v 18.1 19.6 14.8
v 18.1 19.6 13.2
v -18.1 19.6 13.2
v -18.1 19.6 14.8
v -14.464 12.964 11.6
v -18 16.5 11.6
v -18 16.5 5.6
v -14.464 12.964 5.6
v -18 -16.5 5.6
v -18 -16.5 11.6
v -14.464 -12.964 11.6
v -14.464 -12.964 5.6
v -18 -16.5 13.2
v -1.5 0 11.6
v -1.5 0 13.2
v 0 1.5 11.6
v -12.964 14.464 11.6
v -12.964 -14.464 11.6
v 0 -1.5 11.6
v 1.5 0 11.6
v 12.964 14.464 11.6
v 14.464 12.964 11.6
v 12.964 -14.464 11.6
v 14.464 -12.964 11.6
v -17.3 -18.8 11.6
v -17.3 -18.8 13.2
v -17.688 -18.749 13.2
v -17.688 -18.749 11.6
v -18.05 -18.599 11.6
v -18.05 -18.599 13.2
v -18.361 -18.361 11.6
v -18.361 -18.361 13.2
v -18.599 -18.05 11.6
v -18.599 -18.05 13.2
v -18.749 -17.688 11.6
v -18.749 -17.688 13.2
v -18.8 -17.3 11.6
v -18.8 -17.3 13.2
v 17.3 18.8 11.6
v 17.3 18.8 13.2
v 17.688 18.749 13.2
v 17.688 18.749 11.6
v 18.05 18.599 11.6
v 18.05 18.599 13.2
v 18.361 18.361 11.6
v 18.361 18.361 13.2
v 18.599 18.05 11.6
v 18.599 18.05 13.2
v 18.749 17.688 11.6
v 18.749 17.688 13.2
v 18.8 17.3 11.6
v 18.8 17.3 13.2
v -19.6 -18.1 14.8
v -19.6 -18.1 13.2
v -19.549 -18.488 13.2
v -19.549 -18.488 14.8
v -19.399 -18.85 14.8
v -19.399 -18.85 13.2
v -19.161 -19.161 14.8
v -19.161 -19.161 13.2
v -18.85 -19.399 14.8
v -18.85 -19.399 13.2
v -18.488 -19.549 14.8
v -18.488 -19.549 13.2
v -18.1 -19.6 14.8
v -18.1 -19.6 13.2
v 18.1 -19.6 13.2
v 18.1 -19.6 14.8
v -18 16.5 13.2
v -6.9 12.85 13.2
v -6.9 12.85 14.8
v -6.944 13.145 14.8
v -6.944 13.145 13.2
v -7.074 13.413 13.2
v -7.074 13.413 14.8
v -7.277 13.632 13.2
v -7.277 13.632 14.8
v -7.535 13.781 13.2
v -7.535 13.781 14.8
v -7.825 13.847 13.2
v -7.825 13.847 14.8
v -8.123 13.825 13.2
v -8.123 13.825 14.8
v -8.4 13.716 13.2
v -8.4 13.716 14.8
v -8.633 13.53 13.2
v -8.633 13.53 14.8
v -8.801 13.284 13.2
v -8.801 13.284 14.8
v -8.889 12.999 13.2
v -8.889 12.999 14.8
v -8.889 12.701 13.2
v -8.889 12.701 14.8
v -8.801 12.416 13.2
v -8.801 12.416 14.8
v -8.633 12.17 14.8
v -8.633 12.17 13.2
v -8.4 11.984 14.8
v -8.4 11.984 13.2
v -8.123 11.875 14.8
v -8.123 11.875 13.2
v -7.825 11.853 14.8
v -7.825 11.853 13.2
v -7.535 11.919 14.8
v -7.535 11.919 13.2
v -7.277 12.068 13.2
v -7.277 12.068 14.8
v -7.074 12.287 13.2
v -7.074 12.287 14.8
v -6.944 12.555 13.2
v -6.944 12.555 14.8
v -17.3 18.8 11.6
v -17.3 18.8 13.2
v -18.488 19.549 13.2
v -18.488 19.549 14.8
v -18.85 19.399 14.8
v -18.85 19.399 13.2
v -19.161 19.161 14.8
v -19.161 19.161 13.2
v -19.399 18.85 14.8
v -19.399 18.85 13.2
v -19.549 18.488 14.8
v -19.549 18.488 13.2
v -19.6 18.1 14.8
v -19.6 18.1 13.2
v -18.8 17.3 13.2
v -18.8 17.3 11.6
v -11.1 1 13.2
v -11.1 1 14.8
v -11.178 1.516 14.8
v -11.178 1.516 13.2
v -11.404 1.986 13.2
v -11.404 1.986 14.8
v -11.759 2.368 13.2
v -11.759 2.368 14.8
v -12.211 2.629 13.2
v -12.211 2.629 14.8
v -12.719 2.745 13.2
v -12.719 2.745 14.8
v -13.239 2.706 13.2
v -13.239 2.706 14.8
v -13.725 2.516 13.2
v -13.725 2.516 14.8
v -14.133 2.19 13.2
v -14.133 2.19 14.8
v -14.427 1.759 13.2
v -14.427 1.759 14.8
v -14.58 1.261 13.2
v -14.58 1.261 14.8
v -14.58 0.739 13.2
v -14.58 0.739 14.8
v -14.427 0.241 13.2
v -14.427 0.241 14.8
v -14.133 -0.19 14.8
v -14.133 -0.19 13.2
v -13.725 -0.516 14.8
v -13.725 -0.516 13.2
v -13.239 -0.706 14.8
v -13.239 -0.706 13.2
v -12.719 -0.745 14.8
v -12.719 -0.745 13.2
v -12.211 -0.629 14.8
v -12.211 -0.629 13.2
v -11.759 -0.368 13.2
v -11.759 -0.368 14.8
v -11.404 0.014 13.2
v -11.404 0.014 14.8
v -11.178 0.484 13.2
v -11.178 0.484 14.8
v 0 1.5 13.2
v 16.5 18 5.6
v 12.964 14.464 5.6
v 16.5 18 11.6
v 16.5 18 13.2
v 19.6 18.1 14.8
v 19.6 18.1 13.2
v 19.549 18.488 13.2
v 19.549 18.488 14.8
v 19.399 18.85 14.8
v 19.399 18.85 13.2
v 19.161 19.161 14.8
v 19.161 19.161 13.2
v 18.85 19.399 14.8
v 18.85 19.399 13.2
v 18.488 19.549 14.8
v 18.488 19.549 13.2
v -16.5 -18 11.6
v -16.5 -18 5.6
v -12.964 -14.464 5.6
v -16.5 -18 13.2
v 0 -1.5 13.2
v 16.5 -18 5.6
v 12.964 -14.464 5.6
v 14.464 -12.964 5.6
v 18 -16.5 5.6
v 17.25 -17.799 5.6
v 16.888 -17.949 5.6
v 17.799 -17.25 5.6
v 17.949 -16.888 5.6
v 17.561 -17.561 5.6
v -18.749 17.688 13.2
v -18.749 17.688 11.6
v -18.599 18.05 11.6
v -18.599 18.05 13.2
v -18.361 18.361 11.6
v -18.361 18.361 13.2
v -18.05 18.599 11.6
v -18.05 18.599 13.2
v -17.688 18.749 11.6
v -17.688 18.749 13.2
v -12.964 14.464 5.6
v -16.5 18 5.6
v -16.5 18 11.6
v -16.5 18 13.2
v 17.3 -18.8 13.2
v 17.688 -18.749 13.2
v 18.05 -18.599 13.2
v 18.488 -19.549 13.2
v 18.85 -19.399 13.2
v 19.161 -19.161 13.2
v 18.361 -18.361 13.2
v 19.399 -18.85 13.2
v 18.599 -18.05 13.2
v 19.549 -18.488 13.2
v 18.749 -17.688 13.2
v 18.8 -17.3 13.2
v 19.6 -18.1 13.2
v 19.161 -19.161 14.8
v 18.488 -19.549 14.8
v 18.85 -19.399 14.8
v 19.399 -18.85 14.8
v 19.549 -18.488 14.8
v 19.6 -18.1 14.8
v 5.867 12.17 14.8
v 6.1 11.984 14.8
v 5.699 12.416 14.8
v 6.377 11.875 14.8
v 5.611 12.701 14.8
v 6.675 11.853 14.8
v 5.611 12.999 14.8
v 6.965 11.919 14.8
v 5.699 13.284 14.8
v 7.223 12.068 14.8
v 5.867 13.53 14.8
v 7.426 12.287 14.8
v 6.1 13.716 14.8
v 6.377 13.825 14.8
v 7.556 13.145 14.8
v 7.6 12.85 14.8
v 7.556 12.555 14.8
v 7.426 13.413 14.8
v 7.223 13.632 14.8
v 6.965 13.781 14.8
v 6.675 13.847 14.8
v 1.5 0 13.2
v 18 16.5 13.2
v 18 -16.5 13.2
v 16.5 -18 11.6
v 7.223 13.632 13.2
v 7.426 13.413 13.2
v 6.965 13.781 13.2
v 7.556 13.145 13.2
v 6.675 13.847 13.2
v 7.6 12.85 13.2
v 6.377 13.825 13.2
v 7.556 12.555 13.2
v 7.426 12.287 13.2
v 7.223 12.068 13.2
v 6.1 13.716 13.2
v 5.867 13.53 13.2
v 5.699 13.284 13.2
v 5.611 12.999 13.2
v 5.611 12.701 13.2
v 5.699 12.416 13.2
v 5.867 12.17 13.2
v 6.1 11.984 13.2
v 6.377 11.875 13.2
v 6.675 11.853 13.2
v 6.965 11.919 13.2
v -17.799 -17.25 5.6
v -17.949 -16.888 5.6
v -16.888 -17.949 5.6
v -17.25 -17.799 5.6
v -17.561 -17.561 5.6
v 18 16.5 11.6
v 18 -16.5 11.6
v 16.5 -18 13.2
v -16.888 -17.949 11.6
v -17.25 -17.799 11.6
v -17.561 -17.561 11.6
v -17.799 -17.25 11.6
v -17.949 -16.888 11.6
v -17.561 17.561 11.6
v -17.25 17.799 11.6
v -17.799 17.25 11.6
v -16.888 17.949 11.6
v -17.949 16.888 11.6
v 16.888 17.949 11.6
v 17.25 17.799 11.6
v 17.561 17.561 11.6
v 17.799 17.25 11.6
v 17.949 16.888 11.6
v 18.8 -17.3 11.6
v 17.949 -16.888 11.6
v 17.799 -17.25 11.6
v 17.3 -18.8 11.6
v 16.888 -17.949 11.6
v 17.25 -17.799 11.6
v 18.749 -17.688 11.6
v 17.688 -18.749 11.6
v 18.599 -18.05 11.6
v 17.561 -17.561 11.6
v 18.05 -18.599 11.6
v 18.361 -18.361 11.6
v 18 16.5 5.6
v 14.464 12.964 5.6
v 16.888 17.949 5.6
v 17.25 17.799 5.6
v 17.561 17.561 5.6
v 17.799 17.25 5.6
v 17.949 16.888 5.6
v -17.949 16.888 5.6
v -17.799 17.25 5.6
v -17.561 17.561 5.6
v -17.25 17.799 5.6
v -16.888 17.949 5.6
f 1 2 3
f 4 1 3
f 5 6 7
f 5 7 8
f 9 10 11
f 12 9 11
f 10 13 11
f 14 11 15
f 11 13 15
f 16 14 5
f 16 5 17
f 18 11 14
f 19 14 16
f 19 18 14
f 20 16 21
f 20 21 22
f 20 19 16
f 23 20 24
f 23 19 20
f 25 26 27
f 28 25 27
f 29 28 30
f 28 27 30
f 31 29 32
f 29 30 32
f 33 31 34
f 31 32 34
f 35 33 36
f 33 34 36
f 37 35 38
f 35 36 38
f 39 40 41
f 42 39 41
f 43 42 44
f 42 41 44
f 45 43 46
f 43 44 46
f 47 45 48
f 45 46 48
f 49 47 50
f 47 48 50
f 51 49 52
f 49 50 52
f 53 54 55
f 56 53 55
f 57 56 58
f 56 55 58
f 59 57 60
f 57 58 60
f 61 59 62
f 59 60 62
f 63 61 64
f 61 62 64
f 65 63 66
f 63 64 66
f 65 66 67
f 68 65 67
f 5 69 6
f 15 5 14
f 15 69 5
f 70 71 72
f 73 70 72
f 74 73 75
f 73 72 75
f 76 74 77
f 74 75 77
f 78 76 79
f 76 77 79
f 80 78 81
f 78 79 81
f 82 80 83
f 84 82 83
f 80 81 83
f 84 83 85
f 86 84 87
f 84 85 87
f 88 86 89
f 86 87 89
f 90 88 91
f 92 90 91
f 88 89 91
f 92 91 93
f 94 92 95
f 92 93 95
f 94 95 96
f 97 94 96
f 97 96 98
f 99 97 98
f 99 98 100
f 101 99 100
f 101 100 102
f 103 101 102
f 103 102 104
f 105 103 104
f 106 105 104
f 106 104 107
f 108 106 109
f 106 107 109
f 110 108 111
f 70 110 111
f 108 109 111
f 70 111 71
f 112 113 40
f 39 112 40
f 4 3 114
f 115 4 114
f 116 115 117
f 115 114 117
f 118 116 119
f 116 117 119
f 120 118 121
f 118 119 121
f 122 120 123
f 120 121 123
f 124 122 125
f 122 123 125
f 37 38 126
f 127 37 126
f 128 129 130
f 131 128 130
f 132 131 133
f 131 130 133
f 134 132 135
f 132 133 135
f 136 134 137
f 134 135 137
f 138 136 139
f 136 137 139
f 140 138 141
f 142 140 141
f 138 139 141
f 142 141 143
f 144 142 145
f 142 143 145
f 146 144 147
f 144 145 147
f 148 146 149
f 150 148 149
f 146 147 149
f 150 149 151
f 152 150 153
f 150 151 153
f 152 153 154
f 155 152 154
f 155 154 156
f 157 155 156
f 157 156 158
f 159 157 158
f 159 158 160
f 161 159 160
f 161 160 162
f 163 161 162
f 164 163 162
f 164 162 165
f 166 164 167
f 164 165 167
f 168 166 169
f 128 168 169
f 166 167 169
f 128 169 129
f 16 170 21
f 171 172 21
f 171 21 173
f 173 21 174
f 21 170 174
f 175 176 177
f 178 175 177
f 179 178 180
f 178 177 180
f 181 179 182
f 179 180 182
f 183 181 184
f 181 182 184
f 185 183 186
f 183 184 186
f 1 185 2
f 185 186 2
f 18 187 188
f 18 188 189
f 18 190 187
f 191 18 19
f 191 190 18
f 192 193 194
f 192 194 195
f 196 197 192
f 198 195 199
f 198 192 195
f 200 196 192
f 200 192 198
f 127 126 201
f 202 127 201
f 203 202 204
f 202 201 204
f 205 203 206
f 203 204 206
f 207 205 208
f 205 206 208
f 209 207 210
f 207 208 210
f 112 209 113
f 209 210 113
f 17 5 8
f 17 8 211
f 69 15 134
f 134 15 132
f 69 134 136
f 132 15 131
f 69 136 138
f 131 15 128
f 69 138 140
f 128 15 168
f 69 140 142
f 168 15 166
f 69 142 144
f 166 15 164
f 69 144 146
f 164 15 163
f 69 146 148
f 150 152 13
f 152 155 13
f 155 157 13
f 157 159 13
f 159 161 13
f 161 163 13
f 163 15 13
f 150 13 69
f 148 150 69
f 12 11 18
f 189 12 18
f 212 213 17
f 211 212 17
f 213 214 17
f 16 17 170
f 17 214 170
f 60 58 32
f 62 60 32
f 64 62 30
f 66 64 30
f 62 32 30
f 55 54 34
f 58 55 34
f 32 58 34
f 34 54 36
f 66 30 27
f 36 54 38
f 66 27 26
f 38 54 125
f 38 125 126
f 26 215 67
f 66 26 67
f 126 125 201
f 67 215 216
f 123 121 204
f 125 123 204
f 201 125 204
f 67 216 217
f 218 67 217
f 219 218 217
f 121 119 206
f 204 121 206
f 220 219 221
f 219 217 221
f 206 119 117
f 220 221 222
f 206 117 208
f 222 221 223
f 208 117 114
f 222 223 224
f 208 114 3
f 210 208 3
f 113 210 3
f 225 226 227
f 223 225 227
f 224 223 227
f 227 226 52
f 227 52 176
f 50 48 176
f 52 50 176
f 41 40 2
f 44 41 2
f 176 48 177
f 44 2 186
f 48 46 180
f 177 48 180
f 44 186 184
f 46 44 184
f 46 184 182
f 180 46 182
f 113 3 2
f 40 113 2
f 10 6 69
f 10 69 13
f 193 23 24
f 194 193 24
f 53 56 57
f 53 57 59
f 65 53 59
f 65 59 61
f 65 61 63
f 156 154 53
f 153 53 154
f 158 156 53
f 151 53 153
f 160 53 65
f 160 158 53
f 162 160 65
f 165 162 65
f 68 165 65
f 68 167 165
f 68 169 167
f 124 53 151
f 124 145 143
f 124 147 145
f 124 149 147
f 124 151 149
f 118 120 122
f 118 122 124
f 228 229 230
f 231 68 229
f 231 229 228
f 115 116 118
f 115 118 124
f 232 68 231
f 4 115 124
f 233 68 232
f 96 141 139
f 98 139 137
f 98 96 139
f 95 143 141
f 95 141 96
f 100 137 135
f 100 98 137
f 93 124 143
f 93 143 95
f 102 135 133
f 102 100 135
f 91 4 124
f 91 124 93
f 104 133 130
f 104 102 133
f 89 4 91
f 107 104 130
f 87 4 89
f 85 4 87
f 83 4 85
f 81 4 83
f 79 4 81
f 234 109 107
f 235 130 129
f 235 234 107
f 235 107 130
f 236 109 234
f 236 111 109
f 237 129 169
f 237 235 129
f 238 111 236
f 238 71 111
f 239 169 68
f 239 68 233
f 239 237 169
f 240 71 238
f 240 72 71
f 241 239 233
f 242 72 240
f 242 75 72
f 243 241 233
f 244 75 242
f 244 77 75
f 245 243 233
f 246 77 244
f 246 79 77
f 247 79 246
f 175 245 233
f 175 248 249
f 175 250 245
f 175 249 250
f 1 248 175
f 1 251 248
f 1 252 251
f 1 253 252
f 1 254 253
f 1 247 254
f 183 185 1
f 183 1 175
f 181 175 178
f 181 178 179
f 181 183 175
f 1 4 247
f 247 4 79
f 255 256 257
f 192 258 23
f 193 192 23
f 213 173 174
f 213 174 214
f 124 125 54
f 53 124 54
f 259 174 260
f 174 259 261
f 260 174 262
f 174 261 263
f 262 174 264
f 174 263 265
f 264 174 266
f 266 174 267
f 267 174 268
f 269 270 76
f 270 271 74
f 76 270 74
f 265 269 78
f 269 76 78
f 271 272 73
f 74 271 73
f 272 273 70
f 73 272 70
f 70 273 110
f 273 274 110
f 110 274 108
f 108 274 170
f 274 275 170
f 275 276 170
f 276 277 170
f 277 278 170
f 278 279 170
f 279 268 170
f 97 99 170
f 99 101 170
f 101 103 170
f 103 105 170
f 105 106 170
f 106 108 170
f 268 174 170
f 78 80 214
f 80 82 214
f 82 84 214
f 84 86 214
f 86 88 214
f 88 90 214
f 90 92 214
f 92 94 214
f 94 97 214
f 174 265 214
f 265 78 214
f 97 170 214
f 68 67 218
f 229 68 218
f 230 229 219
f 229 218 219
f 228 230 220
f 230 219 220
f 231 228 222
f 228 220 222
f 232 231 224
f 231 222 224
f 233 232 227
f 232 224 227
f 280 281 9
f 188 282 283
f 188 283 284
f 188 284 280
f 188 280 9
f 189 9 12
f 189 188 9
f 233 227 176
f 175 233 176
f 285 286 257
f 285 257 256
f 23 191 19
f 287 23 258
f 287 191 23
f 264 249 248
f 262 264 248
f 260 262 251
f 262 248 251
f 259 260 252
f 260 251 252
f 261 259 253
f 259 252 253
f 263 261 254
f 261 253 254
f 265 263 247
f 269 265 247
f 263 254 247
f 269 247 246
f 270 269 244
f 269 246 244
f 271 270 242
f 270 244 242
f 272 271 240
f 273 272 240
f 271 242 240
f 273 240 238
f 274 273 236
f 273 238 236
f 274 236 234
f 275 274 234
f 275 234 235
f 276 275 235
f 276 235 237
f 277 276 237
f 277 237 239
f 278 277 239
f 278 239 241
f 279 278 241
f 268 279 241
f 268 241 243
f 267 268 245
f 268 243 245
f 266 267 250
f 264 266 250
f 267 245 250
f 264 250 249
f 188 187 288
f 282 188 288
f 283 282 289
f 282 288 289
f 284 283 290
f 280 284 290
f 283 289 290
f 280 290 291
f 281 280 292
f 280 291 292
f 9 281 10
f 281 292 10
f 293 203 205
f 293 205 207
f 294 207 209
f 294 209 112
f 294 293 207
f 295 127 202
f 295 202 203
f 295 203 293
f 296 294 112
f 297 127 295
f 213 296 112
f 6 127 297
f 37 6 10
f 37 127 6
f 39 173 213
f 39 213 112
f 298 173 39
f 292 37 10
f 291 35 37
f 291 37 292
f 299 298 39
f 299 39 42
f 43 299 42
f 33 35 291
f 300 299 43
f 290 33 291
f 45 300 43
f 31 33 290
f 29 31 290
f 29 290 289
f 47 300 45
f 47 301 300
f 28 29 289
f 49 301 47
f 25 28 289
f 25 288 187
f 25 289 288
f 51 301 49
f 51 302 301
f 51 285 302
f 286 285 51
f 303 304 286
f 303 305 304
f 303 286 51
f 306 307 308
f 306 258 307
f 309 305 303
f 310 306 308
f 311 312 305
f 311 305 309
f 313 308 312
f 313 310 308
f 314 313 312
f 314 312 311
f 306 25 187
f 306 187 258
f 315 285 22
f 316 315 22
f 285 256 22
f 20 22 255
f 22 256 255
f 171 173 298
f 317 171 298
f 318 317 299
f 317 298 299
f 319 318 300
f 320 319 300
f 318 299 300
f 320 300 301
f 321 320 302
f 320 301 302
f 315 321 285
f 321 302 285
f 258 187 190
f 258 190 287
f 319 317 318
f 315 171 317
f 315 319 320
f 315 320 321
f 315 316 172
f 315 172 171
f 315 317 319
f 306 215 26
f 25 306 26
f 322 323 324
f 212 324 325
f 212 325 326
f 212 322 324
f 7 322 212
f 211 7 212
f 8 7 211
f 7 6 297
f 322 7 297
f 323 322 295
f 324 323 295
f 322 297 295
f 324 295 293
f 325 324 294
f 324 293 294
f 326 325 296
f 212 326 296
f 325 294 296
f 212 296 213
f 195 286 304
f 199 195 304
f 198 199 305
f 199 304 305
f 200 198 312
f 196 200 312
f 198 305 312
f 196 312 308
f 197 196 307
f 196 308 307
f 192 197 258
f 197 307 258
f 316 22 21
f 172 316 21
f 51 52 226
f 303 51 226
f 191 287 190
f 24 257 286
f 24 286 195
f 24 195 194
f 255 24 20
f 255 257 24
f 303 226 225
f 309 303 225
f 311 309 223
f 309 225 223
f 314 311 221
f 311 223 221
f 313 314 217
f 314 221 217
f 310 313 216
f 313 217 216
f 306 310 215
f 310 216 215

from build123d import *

# Parameters (mm, degrees)
PAD003_DEPTH    = 1.6
PAD004_DEPTH    = 1.6
POCKET002_DEPTH = 1.6
PAD005_DEPTH    = 1.6
SKETCH015_R     = 1
SKETCH015_R_2   = 1.75
POCKET004_DEPTH = 1.6
PAD019_DEPTH    = 6


with BuildPart() as part:
    # Sketch005 → Pad003 (new body)
    with BuildSketch(Plane.XY):
        with BuildLine():
            Line((-19.6, 18.1), (-19.6, -18.1))
            ThreePointArc((-19.6, -18.1), (-19.16066, -19.16066), (-18.1, -19.6))
            Line((-18.1, -19.6), (18.1, -19.6))
            ThreePointArc((18.1, -19.6), (19.16066, -19.16066), (19.6, -18.1))
            Line((19.6, -18.1), (19.6, 18.1))
            ThreePointArc((19.6, 18.1), (19.16066, 19.16066), (18.1, 19.6))
            Line((18.1, 19.6), (-18.1, 19.6))
            ThreePointArc((-18.1, 19.6), (-19.16066, 19.16066), (-19.6, 18.1))
        make_face()
    extrude(amount=PAD003_DEPTH)

    # Sketch006 (on Face9 of Pad003) → Pad004 (join)
    with BuildSketch(Plane(origin=(0, 0, 0), x_dir=(1, 0, 0), z_dir=(0, 0, -1))):
        with BuildLine():
            Line((-18.8, 17.3), (-18.8, -17.3))
            ThreePointArc((-18.8, -17.3), (-18.36066, -18.36066), (-17.3, -18.8))
            Line((-17.3, -18.8), (17.3, -18.8))
            ThreePointArc((17.3, -18.8), (18.36066, -18.36066), (18.8, -17.3))
            Line((18.8, -17.3), (18.8, 17.3))
            ThreePointArc((18.8, 17.3), (18.36066, 18.36066), (17.3, 18.8))
            Line((17.3, 18.8), (-17.3, 18.8))
            ThreePointArc((-17.3, 18.8), (-18.36066, 18.36066), (-18.8, 17.3))
        make_face()
    extrude(amount=PAD004_DEPTH)

    # Sketch007 (on Face19 of Pad004) → Pocket002 (cut)
    with BuildSketch(Plane(origin=(0, 0, -1.6), x_dir=(1, 0, 0), z_dir=(0, 0, -1))):
        with BuildLine():
            Line((-18, -16.5), (-18, 16.5))
            ThreePointArc((-16.5, 18), (-17.56066, 17.56066), (-18, 16.5))
            Line((-16.5, 18), (16.5, 18))
            ThreePointArc((18, 16.5), (17.56066, 17.56066), (16.5, 18))
            Line((18, 16.5), (18, -16.5))
            ThreePointArc((16.5, -18), (17.56066, -17.56066), (18, -16.5))
            Line((16.5, -18), (-16.5, -18))
            ThreePointArc((-18, -16.5), (-17.56066, -17.56066), (-16.5, -18))
        make_face()
    extrude(amount=-POCKET002_DEPTH, mode=Mode.SUBTRACT)

    # Sketch008 (on Face28 of Pocket002) → Pad005 (join)
    with BuildSketch(Plane(origin=(0, 0, 0), x_dir=(1, 0, 0), z_dir=(0, 0, -1))):
        with BuildLine():
            ThreePointArc((-18, -16.499999), (-17.560661, -17.56066), (-16.5, -18))
            Line((18, 16.5), (-16.5, -18))
            ThreePointArc((18, 16.5), (17.56066, 17.56066), (16.5, 18))
            Line((-18, -16.499999), (16.5, 18))
        make_face()
        with BuildLine():
            ThreePointArc((-16.5, 18), (-17.56066, 17.56066), (-18, 16.5))
            Line((-18, 16.5), (16.5, -18))
            ThreePointArc((16.5, -18), (17.56066, -17.56066), (18, -16.5))
            Line((-16.5, 18), (18, -16.5))
        make_face()
    extrude(amount=PAD005_DEPTH)

    # Sketch015 (on Face5 of Pad005) → Pocket004 (cut)
    with BuildSketch(Plane.XY.offset(1.6)):
        with Locations((-7.9, 12.85)):
            Circle(SKETCH015_R)
        with Locations((6.6, 12.85)):
            Circle(SKETCH015_R)
        with Locations((-12.85, 1)):
            Circle(SKETCH015_R_2)
    extrude(amount=-POCKET004_DEPTH, mode=Mode.SUBTRACT)

    # Sketch030 (on Face37 of Pocket004) → Pad019 (join)
    with BuildSketch(Plane(origin=(0, 0, -1.6), x_dir=(1, 0, 0), z_dir=(0, 0, -1))):
        with BuildLine():
            ThreePointArc((-16.5, 18), (-17.56066, 17.56066), (-18, 16.5))
            Line((-18, 16.5), (-14.464466, 12.964466))
            Line((-14.464466, 12.964466), (-12.964466, 14.464466))
            Line((-16.5, 18), (-12.964466, 14.464466))
        make_face()
        with BuildLine():
            ThreePointArc((18, 16.5), (17.56066, 17.56066), (16.5, 18))
            Line((16.5, 18), (12.964466, 14.464466))
            Line((12.964466, 14.464466), (14.464466, 12.964466))
            Line((18, 16.5), (14.464466, 12.964466))
        make_face()
        with BuildLine():
            ThreePointArc((16.5, -18), (17.56066, -17.56066), (18, -16.5))
            Line((18, -16.5), (14.464466, -12.964466))
            Line((14.464466, -12.964466), (12.964466, -14.464466))
            Line((16.5, -18), (12.964466, -14.464466))
        make_face()
        with BuildLine():
            ThreePointArc((-18, -16.499999), (-17.56066, -17.56066), (-16.5, -18))
            Line((-16.5, -18), (-12.964466, -14.464466))
            Line((-14.464466, -12.964465), (-12.964466, -14.464466))
            Line((-18, -16.499999), (-14.464466, -12.964465))
        make_face()
    extrude(amount=PAD019_DEPTH)


with BuildPart() as part_1:
    # Body001 placement: moved
    add(part.part.moved(Location((0, 0, 13.2))))


solid = part_1.part
